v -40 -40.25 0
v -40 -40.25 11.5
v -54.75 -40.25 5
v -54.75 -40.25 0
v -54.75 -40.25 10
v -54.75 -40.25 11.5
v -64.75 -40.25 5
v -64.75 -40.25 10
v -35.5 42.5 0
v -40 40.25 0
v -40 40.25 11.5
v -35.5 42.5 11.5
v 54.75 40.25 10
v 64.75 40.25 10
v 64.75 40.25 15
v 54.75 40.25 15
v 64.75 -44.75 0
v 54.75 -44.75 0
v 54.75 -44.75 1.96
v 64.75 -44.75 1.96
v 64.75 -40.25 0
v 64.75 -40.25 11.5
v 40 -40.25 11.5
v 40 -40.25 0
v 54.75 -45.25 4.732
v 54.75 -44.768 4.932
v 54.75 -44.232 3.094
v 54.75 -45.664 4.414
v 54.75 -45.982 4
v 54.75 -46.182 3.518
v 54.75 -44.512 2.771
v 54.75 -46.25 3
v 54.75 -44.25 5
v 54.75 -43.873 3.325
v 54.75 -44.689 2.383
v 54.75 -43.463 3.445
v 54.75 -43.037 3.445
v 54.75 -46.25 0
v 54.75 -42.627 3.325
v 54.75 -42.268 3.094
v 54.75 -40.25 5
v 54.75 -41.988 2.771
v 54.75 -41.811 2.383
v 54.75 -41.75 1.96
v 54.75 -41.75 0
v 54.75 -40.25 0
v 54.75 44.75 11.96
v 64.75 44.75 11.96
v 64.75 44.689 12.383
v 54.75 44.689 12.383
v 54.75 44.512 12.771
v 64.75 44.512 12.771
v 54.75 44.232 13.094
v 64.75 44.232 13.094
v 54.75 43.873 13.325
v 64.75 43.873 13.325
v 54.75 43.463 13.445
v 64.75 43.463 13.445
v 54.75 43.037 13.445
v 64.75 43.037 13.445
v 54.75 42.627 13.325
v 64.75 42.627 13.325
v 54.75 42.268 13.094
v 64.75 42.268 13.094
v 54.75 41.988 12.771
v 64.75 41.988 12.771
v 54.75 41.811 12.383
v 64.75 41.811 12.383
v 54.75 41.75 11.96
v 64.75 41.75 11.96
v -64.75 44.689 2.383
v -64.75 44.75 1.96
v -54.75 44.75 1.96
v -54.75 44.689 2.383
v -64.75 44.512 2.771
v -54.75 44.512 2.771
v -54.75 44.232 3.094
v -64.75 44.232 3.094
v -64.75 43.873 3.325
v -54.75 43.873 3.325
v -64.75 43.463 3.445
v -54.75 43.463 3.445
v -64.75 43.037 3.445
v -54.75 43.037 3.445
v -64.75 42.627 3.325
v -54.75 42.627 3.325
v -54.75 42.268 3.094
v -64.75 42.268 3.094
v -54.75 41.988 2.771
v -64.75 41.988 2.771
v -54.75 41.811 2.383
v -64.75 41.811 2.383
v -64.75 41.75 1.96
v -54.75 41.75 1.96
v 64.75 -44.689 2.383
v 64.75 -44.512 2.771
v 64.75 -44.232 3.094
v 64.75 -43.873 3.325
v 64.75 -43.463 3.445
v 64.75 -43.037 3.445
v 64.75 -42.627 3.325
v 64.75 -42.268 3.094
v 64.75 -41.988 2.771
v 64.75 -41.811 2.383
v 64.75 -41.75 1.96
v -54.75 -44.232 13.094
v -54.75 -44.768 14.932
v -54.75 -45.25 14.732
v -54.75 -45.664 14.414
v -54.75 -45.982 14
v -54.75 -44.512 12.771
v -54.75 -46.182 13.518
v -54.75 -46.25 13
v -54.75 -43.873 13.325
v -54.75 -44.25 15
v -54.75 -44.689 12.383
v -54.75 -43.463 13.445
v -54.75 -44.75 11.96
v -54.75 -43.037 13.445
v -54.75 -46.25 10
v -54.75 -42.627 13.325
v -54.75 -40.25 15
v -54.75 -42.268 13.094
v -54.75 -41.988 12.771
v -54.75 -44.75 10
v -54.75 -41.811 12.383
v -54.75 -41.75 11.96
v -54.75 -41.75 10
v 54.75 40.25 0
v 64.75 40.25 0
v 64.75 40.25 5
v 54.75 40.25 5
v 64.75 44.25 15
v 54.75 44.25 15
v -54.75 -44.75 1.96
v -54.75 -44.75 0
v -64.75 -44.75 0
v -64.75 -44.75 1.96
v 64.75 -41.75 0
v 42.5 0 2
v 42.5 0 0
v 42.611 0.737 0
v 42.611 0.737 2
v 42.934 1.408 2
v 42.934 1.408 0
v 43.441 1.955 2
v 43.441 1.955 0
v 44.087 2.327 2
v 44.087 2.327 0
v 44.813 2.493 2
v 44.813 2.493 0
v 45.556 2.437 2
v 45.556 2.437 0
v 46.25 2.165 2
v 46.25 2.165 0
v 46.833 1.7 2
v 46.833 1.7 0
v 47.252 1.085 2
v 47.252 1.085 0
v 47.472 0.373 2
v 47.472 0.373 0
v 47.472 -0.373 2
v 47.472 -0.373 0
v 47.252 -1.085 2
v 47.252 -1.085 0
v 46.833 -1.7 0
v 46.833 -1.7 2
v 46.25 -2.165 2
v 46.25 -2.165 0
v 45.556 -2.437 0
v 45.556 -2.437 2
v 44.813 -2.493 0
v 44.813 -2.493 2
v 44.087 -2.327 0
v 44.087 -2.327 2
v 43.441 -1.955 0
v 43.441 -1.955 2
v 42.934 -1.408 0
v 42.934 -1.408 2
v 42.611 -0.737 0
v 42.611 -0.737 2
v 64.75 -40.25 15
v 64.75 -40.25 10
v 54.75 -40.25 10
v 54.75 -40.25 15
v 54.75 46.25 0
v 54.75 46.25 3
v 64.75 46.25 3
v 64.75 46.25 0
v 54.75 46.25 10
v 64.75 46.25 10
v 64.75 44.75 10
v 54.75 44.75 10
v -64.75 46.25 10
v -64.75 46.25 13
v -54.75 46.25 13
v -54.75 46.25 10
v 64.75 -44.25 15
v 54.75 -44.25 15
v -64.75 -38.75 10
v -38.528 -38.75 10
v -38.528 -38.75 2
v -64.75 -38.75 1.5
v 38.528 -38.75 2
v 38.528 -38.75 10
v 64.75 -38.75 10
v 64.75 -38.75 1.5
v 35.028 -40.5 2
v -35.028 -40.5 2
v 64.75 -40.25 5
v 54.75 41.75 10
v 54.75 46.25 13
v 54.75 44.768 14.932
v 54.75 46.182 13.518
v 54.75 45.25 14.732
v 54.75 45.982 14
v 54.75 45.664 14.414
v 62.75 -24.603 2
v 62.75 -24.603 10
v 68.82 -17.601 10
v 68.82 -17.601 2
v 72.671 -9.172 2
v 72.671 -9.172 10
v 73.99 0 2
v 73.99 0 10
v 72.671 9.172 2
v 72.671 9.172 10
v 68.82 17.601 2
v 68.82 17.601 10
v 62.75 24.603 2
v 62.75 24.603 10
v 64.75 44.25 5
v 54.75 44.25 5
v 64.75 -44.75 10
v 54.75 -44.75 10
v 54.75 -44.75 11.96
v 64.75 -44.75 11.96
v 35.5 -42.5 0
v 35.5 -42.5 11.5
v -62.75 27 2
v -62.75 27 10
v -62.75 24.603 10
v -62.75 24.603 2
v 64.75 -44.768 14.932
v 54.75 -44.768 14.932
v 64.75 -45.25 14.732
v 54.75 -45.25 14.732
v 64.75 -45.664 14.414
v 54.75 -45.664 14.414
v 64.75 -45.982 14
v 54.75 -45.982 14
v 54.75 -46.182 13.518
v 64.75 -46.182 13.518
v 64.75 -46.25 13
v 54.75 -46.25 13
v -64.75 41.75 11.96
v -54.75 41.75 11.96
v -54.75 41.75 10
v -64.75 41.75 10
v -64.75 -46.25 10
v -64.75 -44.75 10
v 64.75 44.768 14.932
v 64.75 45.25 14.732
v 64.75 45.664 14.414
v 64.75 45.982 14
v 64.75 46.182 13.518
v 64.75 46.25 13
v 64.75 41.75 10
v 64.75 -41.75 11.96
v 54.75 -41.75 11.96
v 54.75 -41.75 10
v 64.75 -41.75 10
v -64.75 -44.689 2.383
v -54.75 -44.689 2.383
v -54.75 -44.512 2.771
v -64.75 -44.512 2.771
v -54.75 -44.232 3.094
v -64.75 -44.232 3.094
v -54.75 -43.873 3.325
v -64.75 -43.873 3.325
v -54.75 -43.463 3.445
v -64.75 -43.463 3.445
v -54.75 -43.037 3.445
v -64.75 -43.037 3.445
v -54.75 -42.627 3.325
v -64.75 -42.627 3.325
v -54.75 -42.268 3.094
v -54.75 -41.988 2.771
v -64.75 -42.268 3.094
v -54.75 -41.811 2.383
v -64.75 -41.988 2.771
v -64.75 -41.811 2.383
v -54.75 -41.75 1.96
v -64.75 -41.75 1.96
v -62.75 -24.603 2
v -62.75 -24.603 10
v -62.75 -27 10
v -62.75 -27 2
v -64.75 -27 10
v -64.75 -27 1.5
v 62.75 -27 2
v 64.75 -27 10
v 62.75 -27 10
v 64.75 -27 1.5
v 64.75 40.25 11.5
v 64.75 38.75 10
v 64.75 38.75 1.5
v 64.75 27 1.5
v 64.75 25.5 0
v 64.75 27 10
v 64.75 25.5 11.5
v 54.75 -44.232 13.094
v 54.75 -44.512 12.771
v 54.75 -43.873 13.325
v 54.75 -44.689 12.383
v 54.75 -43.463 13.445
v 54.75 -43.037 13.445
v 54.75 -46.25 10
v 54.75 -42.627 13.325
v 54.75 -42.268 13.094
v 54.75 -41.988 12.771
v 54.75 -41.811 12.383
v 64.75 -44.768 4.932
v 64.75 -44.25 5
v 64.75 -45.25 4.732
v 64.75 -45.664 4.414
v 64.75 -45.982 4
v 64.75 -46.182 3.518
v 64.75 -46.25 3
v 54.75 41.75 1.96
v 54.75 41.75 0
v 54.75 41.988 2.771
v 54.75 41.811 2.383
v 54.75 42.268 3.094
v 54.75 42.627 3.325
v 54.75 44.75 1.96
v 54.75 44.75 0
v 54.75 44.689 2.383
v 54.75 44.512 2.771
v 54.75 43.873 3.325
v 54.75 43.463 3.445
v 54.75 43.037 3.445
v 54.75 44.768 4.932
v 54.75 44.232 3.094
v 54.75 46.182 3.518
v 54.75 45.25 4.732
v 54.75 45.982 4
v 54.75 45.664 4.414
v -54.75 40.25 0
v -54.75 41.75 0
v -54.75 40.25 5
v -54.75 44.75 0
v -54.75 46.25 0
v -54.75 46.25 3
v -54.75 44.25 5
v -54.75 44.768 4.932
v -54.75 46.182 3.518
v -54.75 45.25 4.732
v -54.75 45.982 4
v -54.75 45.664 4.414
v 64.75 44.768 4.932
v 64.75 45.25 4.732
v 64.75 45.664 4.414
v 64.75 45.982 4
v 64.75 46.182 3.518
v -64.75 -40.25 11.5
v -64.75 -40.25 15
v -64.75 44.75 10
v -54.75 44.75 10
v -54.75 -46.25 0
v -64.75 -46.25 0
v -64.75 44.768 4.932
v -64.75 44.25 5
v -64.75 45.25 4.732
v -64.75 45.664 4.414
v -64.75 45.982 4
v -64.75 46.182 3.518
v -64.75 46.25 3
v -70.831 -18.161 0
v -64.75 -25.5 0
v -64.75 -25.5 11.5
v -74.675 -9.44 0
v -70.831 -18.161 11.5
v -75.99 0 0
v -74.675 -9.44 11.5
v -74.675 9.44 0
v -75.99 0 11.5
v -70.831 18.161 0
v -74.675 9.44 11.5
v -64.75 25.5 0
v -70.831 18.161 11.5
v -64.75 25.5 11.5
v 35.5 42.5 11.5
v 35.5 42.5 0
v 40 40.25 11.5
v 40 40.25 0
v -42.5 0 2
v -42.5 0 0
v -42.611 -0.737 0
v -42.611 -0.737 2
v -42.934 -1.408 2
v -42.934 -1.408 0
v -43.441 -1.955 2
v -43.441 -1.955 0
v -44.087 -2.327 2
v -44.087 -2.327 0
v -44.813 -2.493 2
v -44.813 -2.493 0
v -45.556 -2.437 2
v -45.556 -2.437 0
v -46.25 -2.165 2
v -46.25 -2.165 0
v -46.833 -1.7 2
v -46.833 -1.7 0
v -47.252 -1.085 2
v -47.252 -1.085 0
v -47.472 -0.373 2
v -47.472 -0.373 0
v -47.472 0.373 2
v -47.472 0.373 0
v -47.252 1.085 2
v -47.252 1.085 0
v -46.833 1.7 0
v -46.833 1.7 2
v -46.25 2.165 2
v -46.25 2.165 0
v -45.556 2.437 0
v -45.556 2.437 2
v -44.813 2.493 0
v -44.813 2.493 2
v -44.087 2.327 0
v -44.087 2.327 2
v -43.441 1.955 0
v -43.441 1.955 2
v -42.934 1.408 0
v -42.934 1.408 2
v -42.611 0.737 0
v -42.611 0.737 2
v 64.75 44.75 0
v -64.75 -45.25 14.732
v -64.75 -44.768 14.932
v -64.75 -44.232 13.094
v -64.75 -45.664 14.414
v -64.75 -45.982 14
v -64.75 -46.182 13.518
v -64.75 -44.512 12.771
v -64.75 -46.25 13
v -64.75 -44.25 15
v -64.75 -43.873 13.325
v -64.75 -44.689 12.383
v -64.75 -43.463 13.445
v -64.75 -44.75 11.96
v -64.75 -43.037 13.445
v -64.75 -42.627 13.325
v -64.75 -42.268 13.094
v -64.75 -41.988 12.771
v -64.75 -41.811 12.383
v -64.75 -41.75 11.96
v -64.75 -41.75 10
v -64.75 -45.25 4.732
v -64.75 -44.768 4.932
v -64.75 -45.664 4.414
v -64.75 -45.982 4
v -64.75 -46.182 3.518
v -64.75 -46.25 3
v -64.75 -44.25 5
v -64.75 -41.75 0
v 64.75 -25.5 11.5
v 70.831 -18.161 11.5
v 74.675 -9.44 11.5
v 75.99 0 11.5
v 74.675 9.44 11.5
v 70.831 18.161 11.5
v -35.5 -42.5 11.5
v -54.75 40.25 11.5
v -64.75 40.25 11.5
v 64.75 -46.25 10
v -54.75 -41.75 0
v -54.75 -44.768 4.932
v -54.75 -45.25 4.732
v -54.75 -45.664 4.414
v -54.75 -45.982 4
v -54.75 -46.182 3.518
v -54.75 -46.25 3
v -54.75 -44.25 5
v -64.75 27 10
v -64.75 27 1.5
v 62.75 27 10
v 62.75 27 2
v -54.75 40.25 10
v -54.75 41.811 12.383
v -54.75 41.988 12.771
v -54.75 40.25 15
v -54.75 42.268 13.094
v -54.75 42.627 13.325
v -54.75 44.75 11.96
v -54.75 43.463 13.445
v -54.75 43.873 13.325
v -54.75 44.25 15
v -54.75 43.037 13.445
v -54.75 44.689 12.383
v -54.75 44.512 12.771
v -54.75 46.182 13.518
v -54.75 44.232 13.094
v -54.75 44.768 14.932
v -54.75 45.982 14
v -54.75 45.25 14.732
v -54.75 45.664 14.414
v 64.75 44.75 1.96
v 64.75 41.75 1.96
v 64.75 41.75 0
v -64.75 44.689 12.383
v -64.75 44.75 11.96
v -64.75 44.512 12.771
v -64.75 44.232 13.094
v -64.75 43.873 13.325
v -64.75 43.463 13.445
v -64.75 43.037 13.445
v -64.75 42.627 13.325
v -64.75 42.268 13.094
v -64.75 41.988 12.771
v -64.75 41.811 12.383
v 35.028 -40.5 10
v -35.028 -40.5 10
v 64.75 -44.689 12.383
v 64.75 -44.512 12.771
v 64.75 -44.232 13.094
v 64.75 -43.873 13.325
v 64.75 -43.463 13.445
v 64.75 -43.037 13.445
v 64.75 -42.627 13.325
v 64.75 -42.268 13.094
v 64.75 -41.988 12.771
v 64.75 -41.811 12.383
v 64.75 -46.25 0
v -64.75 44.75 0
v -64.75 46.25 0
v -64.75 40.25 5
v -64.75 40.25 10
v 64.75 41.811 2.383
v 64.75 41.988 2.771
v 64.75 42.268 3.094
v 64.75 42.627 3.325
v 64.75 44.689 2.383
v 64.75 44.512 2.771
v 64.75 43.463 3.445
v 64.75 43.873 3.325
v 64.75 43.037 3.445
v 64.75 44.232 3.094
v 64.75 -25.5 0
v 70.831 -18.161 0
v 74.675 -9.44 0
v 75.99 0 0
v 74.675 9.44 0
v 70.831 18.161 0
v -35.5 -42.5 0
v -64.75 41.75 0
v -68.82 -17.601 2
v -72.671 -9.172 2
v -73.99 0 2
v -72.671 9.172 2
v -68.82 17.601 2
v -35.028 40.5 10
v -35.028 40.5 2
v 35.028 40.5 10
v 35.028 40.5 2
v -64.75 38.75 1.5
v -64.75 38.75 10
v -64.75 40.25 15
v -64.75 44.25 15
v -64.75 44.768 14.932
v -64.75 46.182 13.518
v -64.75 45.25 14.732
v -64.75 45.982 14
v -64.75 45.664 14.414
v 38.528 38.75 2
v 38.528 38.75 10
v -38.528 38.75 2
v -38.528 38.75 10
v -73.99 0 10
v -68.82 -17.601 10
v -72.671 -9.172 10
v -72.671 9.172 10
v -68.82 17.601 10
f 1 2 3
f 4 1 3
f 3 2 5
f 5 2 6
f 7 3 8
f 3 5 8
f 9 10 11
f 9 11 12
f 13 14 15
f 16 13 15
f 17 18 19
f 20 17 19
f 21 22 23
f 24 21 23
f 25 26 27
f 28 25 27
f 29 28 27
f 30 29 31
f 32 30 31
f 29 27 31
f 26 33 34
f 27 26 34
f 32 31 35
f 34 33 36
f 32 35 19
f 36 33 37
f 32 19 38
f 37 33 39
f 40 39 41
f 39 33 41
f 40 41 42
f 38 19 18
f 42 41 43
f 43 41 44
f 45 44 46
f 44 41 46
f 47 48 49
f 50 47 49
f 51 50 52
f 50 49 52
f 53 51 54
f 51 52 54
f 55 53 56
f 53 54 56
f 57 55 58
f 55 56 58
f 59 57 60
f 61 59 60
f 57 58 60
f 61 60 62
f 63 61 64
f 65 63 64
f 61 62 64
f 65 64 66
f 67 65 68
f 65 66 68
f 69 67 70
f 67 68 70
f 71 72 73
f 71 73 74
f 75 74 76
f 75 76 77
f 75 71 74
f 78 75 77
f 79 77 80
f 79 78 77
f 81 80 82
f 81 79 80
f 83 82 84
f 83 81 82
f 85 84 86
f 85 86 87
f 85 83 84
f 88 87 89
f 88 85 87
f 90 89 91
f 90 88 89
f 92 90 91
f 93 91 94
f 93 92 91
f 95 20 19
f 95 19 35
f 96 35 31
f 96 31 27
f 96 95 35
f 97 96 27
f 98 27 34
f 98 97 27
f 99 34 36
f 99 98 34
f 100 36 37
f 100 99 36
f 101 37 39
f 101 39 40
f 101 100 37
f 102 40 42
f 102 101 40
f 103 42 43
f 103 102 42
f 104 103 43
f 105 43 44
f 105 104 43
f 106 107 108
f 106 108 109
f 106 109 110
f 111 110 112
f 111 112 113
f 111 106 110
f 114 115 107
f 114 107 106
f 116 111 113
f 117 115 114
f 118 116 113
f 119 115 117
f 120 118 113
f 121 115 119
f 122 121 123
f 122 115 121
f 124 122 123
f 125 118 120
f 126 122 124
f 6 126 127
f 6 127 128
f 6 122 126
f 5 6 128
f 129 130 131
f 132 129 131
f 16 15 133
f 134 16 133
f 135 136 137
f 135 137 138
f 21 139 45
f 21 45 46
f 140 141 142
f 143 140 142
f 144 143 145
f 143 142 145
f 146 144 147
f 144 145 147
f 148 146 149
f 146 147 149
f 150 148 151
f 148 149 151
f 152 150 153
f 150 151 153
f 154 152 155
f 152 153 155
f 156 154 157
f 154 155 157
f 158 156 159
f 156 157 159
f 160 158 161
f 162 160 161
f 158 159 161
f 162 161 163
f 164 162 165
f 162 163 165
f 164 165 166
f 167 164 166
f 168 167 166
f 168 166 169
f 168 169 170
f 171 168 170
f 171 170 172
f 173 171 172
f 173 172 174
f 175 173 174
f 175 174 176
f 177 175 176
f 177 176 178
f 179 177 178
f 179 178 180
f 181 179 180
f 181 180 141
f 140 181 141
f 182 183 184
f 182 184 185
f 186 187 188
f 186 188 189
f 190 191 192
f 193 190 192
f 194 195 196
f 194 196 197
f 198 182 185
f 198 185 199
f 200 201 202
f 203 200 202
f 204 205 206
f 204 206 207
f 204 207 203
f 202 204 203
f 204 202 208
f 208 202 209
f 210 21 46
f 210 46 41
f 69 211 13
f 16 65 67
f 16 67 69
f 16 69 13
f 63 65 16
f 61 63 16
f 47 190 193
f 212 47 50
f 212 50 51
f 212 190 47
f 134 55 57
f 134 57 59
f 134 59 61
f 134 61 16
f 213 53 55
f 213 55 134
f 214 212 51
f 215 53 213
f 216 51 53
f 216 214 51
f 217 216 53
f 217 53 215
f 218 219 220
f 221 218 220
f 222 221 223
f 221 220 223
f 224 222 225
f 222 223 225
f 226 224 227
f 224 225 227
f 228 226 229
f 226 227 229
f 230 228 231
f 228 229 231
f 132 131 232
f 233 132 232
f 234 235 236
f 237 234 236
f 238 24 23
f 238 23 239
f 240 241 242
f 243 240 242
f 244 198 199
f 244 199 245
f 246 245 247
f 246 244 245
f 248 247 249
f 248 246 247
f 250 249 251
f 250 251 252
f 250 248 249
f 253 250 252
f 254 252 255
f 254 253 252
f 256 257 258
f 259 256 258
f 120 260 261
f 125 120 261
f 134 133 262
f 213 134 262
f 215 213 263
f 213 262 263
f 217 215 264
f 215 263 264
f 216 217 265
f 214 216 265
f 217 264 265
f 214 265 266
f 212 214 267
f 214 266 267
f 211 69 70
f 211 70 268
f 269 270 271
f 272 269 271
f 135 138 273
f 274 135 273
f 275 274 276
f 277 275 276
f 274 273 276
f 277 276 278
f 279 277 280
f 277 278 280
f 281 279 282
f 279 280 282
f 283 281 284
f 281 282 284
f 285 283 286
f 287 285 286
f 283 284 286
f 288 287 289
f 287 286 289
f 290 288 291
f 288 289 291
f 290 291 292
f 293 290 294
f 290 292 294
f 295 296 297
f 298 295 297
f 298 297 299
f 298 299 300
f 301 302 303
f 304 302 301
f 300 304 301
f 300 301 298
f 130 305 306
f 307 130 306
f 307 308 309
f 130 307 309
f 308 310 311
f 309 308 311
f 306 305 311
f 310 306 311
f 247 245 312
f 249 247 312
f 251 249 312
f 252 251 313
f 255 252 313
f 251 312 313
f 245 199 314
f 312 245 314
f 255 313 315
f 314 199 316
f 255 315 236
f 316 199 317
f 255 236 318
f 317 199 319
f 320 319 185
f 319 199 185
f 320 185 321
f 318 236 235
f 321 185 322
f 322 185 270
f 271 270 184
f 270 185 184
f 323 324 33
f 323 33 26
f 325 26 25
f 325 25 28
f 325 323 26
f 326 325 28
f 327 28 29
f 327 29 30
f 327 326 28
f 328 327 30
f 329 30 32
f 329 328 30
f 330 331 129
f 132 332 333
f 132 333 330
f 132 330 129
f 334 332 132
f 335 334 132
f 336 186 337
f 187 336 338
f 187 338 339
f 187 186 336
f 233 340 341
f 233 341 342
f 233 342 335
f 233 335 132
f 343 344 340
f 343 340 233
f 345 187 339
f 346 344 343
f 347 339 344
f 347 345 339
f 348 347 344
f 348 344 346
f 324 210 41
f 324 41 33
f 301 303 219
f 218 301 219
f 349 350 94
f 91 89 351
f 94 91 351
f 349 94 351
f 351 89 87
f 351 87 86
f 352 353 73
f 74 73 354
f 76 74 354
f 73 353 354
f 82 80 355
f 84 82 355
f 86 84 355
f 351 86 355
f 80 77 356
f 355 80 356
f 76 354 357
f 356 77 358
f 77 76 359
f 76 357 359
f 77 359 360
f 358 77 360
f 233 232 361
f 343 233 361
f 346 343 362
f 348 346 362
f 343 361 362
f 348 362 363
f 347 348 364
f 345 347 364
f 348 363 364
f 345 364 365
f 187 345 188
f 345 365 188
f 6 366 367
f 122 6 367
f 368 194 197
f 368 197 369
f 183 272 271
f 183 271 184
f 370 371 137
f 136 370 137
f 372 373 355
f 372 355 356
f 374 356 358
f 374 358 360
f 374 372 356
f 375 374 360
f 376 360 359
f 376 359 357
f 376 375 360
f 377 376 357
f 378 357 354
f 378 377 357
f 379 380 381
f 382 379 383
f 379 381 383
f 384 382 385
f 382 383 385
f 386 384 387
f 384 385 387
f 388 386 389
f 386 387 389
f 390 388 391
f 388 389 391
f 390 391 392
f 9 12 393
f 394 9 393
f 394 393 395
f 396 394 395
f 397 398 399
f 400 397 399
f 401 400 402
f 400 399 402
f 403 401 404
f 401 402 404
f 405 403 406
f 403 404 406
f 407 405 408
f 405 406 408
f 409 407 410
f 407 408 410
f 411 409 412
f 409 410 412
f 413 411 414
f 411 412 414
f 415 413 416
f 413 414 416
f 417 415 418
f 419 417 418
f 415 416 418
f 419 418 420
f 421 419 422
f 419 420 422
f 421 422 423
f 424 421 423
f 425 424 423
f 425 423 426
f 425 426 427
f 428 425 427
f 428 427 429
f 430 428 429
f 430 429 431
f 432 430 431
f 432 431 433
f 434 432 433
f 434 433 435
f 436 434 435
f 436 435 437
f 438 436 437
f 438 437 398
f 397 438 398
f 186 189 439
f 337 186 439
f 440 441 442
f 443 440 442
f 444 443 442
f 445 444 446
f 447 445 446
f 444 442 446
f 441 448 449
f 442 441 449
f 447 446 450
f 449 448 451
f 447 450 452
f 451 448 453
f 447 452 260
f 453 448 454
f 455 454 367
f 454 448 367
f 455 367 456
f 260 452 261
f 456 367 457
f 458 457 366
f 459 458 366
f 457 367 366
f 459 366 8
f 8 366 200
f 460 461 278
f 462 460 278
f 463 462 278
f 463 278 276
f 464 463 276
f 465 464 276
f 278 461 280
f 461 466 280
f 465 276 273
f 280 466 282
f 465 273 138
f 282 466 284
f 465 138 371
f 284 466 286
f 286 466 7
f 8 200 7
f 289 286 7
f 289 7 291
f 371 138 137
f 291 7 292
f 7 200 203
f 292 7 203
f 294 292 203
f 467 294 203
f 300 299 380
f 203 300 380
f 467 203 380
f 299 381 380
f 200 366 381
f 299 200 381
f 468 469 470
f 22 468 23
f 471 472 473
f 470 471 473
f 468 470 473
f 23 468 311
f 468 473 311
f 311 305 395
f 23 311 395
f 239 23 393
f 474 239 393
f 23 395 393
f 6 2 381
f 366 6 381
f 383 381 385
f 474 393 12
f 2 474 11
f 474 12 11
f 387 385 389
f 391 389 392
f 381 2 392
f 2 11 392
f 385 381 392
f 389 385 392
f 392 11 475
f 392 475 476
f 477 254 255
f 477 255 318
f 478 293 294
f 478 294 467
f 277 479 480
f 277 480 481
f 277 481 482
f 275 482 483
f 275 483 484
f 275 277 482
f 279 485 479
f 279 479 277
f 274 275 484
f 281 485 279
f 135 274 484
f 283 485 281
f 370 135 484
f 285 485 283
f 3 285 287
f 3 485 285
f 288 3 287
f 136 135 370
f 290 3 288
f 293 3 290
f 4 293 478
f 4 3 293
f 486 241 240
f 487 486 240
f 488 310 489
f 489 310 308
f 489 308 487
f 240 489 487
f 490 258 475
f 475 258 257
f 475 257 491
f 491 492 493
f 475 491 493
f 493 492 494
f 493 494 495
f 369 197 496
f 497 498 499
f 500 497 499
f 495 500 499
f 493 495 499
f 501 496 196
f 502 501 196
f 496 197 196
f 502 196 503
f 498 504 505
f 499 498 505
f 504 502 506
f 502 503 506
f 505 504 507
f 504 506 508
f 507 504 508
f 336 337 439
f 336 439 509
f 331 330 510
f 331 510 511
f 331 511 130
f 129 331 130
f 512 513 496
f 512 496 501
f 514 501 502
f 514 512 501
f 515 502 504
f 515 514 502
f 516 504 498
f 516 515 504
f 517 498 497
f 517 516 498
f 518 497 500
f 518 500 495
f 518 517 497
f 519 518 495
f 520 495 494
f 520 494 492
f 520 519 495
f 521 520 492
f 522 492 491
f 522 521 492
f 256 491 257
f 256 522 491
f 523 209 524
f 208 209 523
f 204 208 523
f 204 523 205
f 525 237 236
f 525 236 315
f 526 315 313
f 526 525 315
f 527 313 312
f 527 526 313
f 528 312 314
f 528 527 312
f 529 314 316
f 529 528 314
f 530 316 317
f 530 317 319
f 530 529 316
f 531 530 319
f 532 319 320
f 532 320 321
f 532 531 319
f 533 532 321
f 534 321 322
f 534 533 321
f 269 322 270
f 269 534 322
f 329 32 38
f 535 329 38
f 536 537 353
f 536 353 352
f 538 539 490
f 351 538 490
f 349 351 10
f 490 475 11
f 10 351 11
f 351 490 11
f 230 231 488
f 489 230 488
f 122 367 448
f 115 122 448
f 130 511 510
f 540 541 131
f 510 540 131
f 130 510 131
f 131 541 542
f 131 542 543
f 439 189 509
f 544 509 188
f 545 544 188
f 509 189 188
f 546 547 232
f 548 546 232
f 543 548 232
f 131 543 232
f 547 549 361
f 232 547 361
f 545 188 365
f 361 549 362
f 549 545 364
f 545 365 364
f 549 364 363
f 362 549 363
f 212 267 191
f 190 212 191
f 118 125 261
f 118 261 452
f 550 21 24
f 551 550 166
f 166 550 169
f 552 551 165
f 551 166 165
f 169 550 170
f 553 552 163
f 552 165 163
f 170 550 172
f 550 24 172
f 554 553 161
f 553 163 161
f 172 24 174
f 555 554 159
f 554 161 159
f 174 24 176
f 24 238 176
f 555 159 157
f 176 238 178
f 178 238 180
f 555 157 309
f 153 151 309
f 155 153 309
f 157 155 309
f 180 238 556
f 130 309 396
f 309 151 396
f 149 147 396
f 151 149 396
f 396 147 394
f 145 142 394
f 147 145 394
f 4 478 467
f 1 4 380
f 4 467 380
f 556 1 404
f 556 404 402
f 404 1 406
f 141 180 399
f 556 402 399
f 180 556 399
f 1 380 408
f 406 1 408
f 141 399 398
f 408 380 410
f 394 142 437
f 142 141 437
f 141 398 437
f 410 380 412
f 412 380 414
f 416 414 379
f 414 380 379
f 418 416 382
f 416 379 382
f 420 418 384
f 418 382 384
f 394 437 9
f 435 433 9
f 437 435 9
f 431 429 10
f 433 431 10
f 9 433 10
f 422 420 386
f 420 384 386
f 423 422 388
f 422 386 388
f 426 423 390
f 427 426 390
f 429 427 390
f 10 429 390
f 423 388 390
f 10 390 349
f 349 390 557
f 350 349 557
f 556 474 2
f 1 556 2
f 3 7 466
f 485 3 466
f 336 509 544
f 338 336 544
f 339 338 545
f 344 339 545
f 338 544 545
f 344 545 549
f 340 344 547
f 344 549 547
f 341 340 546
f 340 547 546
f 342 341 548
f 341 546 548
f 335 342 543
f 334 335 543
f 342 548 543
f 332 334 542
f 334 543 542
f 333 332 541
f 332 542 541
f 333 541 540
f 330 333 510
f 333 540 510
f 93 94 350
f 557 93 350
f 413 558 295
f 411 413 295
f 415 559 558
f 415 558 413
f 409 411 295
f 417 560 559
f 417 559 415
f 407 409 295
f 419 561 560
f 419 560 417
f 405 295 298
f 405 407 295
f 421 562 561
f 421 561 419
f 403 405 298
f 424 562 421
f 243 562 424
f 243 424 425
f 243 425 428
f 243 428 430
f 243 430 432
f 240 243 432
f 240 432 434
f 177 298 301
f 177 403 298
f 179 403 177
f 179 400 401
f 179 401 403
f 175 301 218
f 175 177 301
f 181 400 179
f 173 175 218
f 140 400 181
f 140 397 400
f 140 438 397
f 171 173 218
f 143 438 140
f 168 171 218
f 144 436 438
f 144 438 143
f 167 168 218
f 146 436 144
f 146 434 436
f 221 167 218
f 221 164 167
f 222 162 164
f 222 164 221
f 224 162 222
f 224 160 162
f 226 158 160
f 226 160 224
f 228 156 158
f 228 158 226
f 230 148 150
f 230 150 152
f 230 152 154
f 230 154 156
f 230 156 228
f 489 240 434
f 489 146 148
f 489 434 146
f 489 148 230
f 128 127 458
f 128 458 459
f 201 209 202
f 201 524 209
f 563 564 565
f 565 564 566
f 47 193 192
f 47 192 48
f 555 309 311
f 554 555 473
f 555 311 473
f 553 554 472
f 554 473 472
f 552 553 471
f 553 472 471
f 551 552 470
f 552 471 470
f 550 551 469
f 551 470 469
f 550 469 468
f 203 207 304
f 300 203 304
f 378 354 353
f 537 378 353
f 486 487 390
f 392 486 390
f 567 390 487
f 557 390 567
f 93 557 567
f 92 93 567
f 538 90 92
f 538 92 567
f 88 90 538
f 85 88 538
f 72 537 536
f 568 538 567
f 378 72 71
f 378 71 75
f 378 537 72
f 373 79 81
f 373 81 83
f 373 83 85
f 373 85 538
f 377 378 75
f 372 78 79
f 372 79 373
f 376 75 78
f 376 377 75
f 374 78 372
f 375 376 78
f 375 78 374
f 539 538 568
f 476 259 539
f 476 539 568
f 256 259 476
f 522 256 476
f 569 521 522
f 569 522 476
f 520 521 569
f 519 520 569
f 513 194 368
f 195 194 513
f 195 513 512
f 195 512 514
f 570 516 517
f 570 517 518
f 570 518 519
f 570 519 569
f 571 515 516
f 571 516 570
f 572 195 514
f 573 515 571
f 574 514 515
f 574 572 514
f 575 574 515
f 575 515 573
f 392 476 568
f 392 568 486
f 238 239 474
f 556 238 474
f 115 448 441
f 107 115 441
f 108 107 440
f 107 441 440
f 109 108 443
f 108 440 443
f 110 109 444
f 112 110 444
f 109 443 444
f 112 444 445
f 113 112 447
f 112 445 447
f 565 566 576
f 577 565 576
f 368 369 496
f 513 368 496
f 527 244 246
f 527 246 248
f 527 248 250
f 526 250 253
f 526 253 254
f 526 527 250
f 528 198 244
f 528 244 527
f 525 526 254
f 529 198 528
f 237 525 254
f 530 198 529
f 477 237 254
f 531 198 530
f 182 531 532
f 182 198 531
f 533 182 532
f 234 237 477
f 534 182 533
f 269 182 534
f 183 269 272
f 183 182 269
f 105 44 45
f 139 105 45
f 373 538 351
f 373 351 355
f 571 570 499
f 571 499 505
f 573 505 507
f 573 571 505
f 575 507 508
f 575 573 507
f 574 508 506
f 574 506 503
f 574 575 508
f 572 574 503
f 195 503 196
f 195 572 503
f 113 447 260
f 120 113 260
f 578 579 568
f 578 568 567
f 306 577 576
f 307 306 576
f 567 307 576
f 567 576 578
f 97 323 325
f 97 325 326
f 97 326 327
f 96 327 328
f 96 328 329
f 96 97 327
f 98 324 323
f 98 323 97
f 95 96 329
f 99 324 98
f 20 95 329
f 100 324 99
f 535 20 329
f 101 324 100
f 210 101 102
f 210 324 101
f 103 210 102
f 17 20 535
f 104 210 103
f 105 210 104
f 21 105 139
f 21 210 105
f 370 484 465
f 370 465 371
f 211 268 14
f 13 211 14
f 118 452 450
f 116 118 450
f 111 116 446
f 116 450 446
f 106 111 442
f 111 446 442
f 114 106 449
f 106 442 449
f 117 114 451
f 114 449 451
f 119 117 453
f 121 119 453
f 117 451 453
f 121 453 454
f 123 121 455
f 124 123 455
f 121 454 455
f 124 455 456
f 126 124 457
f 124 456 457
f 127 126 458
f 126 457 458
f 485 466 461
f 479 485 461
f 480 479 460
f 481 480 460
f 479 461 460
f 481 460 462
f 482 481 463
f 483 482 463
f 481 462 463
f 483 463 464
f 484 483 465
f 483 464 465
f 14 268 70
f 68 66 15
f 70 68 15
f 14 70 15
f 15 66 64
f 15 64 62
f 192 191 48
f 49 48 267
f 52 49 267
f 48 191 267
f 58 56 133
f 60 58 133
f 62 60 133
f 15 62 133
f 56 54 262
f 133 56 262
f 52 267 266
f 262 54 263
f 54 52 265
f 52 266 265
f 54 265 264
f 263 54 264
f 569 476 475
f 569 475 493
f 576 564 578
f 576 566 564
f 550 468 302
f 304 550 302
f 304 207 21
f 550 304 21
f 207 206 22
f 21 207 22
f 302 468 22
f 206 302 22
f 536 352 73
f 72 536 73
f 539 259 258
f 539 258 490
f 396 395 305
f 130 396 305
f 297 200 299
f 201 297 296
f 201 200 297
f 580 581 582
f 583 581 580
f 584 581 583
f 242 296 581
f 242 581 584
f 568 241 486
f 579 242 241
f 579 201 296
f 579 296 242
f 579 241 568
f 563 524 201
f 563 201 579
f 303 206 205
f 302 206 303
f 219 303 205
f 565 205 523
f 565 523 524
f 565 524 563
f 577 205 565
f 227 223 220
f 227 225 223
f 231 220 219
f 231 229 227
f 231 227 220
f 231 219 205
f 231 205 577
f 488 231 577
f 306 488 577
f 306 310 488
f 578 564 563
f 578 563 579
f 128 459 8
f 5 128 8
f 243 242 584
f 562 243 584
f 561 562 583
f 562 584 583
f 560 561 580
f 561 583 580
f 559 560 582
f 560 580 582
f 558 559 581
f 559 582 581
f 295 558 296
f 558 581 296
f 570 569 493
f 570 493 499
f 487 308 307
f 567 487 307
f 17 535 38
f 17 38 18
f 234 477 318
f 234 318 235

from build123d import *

# Parameters (mm, degrees)
SKETCH_1_W          = 152
SKETCH_1_H          = 85
EXTRUDE_1_DEPTH     = 10
CUT_EXTRUDE_1_DEPTH = 88.648445508
CUT_EXTRUDE_2_DEPTH = 88.648445508
SHELL_1_T           = -2
EXTRUDE_START       = 1.5
EXTRUDE_3_DEPTH     = 1.5
EXTRUDE_2_DEPTH     = 10
EXTRUDE_2_2_DEPTH   = 10
EXTRUDE_2_3_DEPTH   = 10
EXTRUDE_2_4_DEPTH   = 10
SKETCH_6_W          = 8.5
SKETCH_6_H          = 11.75
CUT_EXTRUDE_4_DEPTH = 149.902015097
SKETCH_4_R          = 2.5
CUT_EXTRUDE_3_DEPTH = 3


with BuildPart() as part:
    # 草图1 → 凸台-拉伸1 (new body)
    with BuildSketch(Plane.XY):
        Rectangle(SKETCH_1_W, SKETCH_1_H)
    extrude(amount=EXTRUDE_1_DEPTH)

    # 草图2 → 切除-拉伸1 (cut, through all)
    with BuildSketch(Plane.XY.offset(10)):
        Polygon((-35.5, 42.5), (-40, 40.25), (-76, 40.25), (-76, 42.5), align=None)
        Polygon((76, 42.5), (35.5, 42.5), (40, 40.25), (76, 40.25), align=None)
        Polygon((35.5, -42.5), (40, -40.25), (76, -40.25), (76, -42.5), align=None)
        Polygon((-76, -42.5), (-35.5, -42.5), (-40, -40.25), (-76, -40.25), align=None)
    extrude(amount=-CUT_EXTRUDE_1_DEPTH, mode=Mode.SUBTRACT)

    # 草图3 → 切除-拉伸2 (cut, through all)
    with BuildSketch(Plane.XY.offset(10)):
        with BuildLine():
            Line((-64.75, -25.5), (-64.75, -40.25))
            Line((-64.75, -40.25), (-76, -40.25))
            Line((-76, -40.25), (-76, 40.25))
            Line((-76, 40.25), (-64.75, 40.25))
            Line((-64.75, 40.25), (-64.75, 25.5))
            ThreePointArc((-64.75, 25.5), (-75.99, 0), (-64.75, -25.5))
        make_face()
        with BuildLine():
            Line((64.75, 40.25), (76, 40.25))
            Line((76, 40.25), (76, -40.25))
            Line((76, -40.25), (64.75, -40.25))
            Line((64.75, -40.25), (64.75, -25.5))
            ThreePointArc((64.75, -25.5), (75.99, 0), (64.75, 25.5))
            Line((64.75, 25.5), (64.75, 40.25))
        make_face()
    extrude(amount=-CUT_EXTRUDE_2_DEPTH, mode=Mode.SUBTRACT)

    # 抽壳1
    shell_1_openings = [part.faces().sort_by_distance(p)[0] for p in [
        (0, 0, 10),
    ]]
    offset(amount=SHELL_1_T, openings=shell_1_openings, kind=Kind.INTERSECTION)

    # 草图7 → 凸台-拉伸3 (add)
    with BuildSketch(Plane.XY.offset(10).offset(EXTRUDE_START)):
        with BuildLine():
            Line((-64.75, 40.25), (-40, 40.25))
            Line((-40, 40.25), (-35.5, 42.5))
            Line((-35.5, 42.5), (35.5, 42.5))
            Line((35.5, 42.5), (40, 40.25))
            Line((40, 40.25), (64.75, 40.25))
            Line((64.75, 40.25), (64.75, 25.5))
            ThreePointArc((64.75, 25.5), (75.99, 0), (64.75, -25.5))
            Line((64.75, -25.5), (64.75, -40.25))
            Line((64.75, -40.25), (40, -40.25))
            Line((40, -40.25), (35.5, -42.5))
            Line((35.5, -42.5), (-35.5, -42.5))
            Line((-35.5, -42.5), (-40, -40.25))
            Line((-40, -40.25), (-64.75, -40.25))
            Line((-64.75, -40.25), (-64.75, -25.5))
            ThreePointArc((-64.75, -25.5), (-75.99, 0), (-64.75, 25.5))
            Line((-64.75, 25.5), (-64.75, 40.25))
        make_face()
    extrude(amount=-EXTRUDE_3_DEPTH)


with BuildPart() as body_2:
    # 草图5 → 凸台-拉伸2 (new body)
    with BuildSketch(Plane(origin=(64.75, 0, 0), x_dir=(0, 0, -1), z_dir=(1, 0, 0))):
        with BuildLine():
            Line((0, 40.25), (-5, 40.25))
            Line((-5, 40.25), (-5, 44.25))
            ThreePointArc((-5, 44.25), (-4.414213562, 45.664213562), (-3, 46.25))
            Line((-3, 46.25), (0, 46.25))
            Line((0, 46.25), (0, 44.75))
            Line((0, 44.75), (-1.96025928, 44.75))
            ThreePointArc((-1.96025928, 44.75), (-3.46025928, 43.25), (-1.96025928, 41.75))
            Line((-1.96025928, 41.75), (0, 41.75))
            Line((0, 41.75), (0, 40.25))
        make_face()
    extrude_2 = extrude(amount=-EXTRUDE_2_DEPTH)


with BuildPart() as body_3:
    # 草图5 → Extrude 2 2 (new body)
    with BuildSketch(Plane(origin=(64.75, 0, 0), x_dir=(0, 0, -1), z_dir=(1, 0, 0))):
        with BuildLine():
            Line((-10, 40.25), (-15, 40.25))
            Line((-15, 40.25), (-15, 44.25))
            ThreePointArc((-15, 44.25), (-14.414213562, 45.664213562), (-13, 46.25))
            Line((-13, 46.25), (-10, 46.25))
            Line((-10, 46.25), (-10, 44.75))
            Line((-10, 44.75), (-11.96025928, 44.75))
            ThreePointArc((-11.96025928, 44.75), (-13.46025928, 43.25), (-11.96025928, 41.75))
            Line((-11.96025928, 41.75), (-10, 41.75))
            Line((-10, 41.75), (-10, 40.25))
        make_face()
    extrude_2_2 = extrude(amount=-EXTRUDE_2_2_DEPTH)


with BuildPart() as body_4:
    # 草图5 → Extrude 2 3 (new body)
    with BuildSketch(Plane(origin=(64.75, 0, 0), x_dir=(0, 0, -1), z_dir=(1, 0, 0))):
        with BuildLine():
            Line((-10, -41.75), (-10, -40.25))
            Line((-10, -40.25), (-15, -40.25))
            Line((-15, -40.25), (-15, -44.25))
            ThreePointArc((-15, -44.25), (-14.414213562, -45.664213562), (-13, -46.25))
            Line((-13, -46.25), (-10, -46.25))
            Line((-10, -46.25), (-10, -44.75))
            Line((-10, -44.75), (-11.96025928, -44.75))
            ThreePointArc((-11.96025928, -44.75), (-13.46025928, -43.25), (-11.96025928, -41.75))
            Line((-11.96025928, -41.75), (-10, -41.75))
        make_face()
    extrude_2_3 = extrude(amount=-EXTRUDE_2_3_DEPTH)


with BuildPart() as body_5:
    # 草图5 → Extrude 2 4 (new body)
    with BuildSketch(Plane(origin=(64.75, 0, 0), x_dir=(0, 0, -1), z_dir=(1, 0, 0))):
        with BuildLine():
            Line((0, -41.75), (0, -40.25))
            Line((0, -40.25), (-5, -40.25))
            Line((-5, -40.25), (-5, -44.25))
            ThreePointArc((-5, -44.25), (-4.414213562, -45.664213562), (-3, -46.25))
            Line((-3, -46.25), (0, -46.25))
            Line((0, -46.25), (0, -44.75))
            Line((0, -44.75), (-1.96025928, -44.75))
            ThreePointArc((-1.96025928, -44.75), (-3.46025928, -43.25), (-1.96025928, -41.75))
            Line((-1.96025928, -41.75), (0, -41.75))
        make_face()
    extrude_2_4 = extrude(amount=-EXTRUDE_2_4_DEPTH)


with BuildPart() as part_1:
    add(part.part)

    # 镜向10: 凸台-拉伸2, Extrude 2 2, Extrude 2 3, Extrude 2 4 across plane
    add(extrude_2.mirror(Plane(origin=(0, 0, 0), x_dir=(0, 0, 1), z_dir=(1, 0, 0))))
    add(extrude_2_2.mirror(Plane(origin=(0, 0, 0), x_dir=(0, 0, 1), z_dir=(1, 0, 0))))
    add(extrude_2_3.mirror(Plane(origin=(0, 0, 0), x_dir=(0, 0, 1), z_dir=(1, 0, 0))))
    add(extrude_2_4.mirror(Plane(origin=(0, 0, 0), x_dir=(0, 0, 1), z_dir=(1, 0, 0))))

    # 草图6 → 切除-拉伸4 (cut, through all)
    with BuildSketch(Plane(origin=(64.75, 0, 0), x_dir=(0, 0, -1), z_dir=(1, 0, 0))):
        with Locations((-5.75, -32.875)):
            Rectangle(SKETCH_6_W, SKETCH_6_H)
        with Locations((-5.75, 32.875)):
            Rectangle(SKETCH_6_W, SKETCH_6_H)
    extrude(amount=-CUT_EXTRUDE_4_DEPTH, mode=Mode.SUBTRACT)

    # 草图4 → 切除-拉伸3 (cut)
    with BuildSketch(Plane(origin=(0, 0, 0), x_dir=(-1, 0, 0), z_dir=(0, 0, -1))):
        with Locations((-45, 0)):
            Circle(SKETCH_4_R)
        with Locations(Location((45, 0, 0), (0, 0, 180))):
            Circle(SKETCH_4_R)
    extrude(amount=-CUT_EXTRUDE_3_DEPTH, mode=Mode.SUBTRACT)


solid = Compound([body_2.part, body_3.part, body_4.part, body_5.part, part_1.part])
